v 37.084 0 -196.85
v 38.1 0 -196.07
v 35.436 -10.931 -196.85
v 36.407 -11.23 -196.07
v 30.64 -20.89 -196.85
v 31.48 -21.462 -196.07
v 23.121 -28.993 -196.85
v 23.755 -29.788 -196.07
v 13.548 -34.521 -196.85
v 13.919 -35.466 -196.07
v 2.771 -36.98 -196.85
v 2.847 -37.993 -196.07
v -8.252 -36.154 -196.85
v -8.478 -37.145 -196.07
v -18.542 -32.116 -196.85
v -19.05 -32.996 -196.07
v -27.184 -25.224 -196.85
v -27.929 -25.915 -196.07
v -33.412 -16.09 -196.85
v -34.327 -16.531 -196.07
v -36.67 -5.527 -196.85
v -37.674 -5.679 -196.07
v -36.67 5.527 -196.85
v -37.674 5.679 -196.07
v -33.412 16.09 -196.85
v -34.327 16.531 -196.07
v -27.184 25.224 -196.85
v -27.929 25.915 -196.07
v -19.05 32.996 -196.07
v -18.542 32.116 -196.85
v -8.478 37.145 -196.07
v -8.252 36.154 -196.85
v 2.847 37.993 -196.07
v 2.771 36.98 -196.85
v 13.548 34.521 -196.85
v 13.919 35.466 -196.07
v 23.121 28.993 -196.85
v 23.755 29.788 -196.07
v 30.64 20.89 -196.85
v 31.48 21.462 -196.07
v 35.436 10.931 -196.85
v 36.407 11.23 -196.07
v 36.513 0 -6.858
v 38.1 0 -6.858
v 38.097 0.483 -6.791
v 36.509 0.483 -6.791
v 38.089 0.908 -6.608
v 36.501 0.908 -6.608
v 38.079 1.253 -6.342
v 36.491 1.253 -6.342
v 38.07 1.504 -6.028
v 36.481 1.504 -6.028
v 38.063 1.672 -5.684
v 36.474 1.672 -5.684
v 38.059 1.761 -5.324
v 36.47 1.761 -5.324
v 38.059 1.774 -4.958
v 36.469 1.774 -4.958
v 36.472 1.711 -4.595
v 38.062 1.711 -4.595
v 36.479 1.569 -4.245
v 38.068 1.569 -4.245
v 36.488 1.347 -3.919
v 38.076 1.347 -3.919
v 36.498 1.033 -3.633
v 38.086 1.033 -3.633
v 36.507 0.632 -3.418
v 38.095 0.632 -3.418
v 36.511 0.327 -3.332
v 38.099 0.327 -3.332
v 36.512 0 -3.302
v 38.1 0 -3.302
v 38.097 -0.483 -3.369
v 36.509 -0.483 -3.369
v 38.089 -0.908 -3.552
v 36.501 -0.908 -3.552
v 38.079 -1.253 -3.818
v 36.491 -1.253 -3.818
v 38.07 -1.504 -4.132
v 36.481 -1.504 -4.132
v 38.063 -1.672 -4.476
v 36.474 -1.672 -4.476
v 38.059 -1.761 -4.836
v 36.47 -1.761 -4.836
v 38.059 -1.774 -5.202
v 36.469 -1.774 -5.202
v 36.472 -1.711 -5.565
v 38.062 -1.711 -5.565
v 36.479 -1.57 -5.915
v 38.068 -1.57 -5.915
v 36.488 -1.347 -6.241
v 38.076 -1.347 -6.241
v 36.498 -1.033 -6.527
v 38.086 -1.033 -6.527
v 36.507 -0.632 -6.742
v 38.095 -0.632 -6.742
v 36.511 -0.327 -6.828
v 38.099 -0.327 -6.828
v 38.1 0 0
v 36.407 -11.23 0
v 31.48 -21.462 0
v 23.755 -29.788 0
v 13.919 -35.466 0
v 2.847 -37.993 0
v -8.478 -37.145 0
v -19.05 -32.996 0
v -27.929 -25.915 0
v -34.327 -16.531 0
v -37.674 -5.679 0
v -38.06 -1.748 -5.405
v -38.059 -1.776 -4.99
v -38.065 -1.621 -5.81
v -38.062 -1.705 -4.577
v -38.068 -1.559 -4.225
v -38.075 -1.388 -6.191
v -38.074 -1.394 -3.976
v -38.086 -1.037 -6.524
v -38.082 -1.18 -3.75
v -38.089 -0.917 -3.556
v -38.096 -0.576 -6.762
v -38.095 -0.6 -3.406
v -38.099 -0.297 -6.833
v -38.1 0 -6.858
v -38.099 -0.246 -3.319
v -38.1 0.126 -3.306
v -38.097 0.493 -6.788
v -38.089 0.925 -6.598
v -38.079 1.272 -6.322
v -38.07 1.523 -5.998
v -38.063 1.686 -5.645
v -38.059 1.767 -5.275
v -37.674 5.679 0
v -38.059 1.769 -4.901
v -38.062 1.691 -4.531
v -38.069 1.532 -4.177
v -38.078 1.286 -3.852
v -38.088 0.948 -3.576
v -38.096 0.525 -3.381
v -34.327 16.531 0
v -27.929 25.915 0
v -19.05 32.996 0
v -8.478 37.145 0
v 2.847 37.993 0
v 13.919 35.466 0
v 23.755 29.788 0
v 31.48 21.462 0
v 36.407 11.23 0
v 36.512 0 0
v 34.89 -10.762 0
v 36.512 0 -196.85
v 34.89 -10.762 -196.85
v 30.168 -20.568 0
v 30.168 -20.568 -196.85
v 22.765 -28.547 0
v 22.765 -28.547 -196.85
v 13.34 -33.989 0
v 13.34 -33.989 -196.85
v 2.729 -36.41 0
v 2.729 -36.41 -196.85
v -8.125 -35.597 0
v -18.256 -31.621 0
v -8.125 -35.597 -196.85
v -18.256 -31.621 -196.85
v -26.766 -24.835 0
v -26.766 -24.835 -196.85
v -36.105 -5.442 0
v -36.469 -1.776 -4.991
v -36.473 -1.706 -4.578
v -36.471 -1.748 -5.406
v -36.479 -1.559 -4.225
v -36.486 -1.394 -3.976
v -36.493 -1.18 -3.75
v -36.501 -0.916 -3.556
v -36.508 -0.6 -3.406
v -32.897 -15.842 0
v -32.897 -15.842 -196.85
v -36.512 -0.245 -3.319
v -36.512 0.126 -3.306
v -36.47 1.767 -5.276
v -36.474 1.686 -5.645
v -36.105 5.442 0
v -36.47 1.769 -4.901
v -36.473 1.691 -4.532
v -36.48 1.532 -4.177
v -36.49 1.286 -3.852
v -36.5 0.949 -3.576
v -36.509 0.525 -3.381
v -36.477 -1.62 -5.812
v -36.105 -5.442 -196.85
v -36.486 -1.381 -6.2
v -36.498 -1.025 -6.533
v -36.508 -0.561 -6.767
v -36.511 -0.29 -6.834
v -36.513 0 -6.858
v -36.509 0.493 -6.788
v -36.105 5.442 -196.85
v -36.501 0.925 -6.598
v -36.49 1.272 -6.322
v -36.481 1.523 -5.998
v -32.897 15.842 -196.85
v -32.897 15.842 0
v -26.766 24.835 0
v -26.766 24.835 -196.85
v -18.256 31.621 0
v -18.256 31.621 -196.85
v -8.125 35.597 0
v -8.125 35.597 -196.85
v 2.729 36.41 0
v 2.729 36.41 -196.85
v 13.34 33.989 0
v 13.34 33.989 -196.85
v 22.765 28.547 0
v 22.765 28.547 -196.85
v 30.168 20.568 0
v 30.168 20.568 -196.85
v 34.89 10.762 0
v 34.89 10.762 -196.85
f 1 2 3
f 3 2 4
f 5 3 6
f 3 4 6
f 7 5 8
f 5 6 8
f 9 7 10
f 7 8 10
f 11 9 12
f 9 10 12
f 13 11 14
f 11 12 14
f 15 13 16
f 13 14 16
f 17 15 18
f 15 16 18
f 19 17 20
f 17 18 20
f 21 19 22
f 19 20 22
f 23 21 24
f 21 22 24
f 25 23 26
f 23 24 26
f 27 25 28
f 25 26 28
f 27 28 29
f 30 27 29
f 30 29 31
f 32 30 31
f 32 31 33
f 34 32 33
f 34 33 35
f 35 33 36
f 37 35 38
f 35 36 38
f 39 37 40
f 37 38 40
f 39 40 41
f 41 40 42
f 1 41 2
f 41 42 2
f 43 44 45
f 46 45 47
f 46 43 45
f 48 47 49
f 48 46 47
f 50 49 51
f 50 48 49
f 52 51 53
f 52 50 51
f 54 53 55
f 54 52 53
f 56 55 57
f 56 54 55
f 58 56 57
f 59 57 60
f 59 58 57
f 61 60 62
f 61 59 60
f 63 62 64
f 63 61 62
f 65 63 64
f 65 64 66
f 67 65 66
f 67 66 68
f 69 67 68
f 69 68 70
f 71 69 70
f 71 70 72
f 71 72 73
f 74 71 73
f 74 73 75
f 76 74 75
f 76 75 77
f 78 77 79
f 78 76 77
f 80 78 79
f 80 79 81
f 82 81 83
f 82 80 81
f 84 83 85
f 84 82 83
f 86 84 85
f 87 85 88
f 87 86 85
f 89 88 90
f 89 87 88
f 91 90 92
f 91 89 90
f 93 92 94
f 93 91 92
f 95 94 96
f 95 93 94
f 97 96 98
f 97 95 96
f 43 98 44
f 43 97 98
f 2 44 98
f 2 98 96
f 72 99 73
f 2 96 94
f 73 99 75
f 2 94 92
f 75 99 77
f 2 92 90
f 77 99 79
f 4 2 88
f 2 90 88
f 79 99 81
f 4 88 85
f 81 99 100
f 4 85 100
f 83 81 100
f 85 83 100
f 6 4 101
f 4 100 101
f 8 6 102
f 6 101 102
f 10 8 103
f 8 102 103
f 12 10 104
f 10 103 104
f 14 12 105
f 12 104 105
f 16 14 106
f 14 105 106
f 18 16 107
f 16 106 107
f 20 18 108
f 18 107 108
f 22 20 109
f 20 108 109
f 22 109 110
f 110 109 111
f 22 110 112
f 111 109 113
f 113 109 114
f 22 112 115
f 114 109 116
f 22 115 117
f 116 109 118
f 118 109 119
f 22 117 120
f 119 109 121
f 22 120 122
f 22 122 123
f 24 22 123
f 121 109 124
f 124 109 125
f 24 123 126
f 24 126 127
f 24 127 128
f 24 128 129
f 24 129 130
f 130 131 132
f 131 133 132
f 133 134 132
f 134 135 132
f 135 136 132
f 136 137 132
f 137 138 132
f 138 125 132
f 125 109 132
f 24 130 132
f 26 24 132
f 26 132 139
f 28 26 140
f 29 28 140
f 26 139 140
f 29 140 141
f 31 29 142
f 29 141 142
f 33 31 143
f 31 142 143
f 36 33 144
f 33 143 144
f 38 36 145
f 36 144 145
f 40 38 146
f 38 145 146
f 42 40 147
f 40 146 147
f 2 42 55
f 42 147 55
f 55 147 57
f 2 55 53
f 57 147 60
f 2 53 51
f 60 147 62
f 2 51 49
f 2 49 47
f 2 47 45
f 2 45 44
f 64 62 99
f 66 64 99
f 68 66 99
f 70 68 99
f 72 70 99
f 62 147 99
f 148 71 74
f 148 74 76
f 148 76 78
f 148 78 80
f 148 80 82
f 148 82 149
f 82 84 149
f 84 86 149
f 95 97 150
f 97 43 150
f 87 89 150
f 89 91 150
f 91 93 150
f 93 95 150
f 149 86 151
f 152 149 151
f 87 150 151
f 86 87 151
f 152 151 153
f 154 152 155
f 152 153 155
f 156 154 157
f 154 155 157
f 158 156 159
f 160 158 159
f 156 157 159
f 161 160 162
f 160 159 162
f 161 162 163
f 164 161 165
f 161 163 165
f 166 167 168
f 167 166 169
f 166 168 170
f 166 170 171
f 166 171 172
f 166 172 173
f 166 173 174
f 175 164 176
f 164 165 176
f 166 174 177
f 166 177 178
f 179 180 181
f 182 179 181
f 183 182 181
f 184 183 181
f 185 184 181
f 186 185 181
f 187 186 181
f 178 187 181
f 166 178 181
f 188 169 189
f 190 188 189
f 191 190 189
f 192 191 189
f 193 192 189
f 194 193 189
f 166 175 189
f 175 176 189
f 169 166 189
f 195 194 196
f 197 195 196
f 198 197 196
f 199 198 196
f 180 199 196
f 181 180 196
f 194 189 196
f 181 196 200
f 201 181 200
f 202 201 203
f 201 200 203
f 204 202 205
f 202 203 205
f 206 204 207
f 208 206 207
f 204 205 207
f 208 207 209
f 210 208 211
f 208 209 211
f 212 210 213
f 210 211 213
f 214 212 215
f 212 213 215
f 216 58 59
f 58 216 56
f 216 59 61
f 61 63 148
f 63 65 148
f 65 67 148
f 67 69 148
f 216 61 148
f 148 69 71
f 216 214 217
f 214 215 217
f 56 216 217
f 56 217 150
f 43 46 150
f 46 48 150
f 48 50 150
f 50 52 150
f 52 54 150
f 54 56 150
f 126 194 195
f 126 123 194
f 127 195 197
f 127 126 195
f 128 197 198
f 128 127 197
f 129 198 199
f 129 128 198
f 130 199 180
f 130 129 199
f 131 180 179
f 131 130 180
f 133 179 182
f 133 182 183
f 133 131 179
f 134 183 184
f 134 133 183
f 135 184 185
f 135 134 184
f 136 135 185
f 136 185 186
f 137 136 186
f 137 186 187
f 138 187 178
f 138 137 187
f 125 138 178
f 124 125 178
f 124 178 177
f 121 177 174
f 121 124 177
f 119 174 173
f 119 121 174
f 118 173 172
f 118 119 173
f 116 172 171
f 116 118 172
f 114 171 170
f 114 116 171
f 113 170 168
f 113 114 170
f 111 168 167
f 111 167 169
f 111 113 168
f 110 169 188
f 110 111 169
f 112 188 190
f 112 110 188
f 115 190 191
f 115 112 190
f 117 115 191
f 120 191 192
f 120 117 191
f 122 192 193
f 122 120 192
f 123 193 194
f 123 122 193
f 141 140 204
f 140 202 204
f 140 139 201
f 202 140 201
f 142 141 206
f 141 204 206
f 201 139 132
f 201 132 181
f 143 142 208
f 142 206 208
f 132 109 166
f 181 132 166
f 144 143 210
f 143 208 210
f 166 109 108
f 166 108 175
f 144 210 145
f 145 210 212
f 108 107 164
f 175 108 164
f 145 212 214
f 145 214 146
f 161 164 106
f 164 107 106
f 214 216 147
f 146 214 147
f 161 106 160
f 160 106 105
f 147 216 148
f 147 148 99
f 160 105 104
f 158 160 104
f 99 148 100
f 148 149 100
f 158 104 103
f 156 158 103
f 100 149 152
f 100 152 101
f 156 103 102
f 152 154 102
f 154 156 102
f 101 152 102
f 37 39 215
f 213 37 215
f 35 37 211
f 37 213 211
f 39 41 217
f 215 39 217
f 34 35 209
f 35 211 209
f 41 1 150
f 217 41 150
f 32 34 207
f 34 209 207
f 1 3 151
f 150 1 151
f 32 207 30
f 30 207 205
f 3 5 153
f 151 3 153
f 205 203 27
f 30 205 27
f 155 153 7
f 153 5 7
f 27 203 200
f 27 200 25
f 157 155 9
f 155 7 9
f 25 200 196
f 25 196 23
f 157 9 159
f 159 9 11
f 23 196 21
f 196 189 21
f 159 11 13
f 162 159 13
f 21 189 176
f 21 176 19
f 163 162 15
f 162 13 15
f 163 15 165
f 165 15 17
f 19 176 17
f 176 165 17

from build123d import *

# Parameters (mm, degrees)
CUT_EXTRUDE1_DEPTH      = 205.091015236
CUT_EXTRUDE1_DEPTH_BACK = 205.091015236
SKETCH2_R               = 1.778


with BuildPart() as part:
    # Sketch1 → Revolve1 (revolve)
    with BuildSketch(Plane(origin=(0, 0, 0), x_dir=(0, 0, -1), z_dir=(1, 0, 0)), mode=Mode.PRIVATE) as revolve1_sk:
        Polygon((0, 36.5125), (196.85, 36.5125), (196.85, 37.084), (196.07039578, 38.1), (0, 38.1), align=None)
    revolve(revolve1_sk.sketch.rotate(Axis((0, 0, 6.983722976), (0, 0, -1)), 90), axis=Axis((0, 0, 6.983722976), (0, 0, -1)))

    # Sketch2 → Cut-Extrude1 (cut, two sides: drawn at the far end of the back side and taken through both)
    with BuildSketch(Plane(origin=(0, 0, 0), x_dir=(0, 0, -1), z_dir=(1, 0, 0)).offset(-CUT_EXTRUDE1_DEPTH_BACK)):
        with Locations((5.08, 0)):
            Circle(SKETCH2_R)
    extrude(amount=CUT_EXTRUDE1_DEPTH + CUT_EXTRUDE1_DEPTH_BACK, mode=Mode.SUBTRACT)


solid = part.part
